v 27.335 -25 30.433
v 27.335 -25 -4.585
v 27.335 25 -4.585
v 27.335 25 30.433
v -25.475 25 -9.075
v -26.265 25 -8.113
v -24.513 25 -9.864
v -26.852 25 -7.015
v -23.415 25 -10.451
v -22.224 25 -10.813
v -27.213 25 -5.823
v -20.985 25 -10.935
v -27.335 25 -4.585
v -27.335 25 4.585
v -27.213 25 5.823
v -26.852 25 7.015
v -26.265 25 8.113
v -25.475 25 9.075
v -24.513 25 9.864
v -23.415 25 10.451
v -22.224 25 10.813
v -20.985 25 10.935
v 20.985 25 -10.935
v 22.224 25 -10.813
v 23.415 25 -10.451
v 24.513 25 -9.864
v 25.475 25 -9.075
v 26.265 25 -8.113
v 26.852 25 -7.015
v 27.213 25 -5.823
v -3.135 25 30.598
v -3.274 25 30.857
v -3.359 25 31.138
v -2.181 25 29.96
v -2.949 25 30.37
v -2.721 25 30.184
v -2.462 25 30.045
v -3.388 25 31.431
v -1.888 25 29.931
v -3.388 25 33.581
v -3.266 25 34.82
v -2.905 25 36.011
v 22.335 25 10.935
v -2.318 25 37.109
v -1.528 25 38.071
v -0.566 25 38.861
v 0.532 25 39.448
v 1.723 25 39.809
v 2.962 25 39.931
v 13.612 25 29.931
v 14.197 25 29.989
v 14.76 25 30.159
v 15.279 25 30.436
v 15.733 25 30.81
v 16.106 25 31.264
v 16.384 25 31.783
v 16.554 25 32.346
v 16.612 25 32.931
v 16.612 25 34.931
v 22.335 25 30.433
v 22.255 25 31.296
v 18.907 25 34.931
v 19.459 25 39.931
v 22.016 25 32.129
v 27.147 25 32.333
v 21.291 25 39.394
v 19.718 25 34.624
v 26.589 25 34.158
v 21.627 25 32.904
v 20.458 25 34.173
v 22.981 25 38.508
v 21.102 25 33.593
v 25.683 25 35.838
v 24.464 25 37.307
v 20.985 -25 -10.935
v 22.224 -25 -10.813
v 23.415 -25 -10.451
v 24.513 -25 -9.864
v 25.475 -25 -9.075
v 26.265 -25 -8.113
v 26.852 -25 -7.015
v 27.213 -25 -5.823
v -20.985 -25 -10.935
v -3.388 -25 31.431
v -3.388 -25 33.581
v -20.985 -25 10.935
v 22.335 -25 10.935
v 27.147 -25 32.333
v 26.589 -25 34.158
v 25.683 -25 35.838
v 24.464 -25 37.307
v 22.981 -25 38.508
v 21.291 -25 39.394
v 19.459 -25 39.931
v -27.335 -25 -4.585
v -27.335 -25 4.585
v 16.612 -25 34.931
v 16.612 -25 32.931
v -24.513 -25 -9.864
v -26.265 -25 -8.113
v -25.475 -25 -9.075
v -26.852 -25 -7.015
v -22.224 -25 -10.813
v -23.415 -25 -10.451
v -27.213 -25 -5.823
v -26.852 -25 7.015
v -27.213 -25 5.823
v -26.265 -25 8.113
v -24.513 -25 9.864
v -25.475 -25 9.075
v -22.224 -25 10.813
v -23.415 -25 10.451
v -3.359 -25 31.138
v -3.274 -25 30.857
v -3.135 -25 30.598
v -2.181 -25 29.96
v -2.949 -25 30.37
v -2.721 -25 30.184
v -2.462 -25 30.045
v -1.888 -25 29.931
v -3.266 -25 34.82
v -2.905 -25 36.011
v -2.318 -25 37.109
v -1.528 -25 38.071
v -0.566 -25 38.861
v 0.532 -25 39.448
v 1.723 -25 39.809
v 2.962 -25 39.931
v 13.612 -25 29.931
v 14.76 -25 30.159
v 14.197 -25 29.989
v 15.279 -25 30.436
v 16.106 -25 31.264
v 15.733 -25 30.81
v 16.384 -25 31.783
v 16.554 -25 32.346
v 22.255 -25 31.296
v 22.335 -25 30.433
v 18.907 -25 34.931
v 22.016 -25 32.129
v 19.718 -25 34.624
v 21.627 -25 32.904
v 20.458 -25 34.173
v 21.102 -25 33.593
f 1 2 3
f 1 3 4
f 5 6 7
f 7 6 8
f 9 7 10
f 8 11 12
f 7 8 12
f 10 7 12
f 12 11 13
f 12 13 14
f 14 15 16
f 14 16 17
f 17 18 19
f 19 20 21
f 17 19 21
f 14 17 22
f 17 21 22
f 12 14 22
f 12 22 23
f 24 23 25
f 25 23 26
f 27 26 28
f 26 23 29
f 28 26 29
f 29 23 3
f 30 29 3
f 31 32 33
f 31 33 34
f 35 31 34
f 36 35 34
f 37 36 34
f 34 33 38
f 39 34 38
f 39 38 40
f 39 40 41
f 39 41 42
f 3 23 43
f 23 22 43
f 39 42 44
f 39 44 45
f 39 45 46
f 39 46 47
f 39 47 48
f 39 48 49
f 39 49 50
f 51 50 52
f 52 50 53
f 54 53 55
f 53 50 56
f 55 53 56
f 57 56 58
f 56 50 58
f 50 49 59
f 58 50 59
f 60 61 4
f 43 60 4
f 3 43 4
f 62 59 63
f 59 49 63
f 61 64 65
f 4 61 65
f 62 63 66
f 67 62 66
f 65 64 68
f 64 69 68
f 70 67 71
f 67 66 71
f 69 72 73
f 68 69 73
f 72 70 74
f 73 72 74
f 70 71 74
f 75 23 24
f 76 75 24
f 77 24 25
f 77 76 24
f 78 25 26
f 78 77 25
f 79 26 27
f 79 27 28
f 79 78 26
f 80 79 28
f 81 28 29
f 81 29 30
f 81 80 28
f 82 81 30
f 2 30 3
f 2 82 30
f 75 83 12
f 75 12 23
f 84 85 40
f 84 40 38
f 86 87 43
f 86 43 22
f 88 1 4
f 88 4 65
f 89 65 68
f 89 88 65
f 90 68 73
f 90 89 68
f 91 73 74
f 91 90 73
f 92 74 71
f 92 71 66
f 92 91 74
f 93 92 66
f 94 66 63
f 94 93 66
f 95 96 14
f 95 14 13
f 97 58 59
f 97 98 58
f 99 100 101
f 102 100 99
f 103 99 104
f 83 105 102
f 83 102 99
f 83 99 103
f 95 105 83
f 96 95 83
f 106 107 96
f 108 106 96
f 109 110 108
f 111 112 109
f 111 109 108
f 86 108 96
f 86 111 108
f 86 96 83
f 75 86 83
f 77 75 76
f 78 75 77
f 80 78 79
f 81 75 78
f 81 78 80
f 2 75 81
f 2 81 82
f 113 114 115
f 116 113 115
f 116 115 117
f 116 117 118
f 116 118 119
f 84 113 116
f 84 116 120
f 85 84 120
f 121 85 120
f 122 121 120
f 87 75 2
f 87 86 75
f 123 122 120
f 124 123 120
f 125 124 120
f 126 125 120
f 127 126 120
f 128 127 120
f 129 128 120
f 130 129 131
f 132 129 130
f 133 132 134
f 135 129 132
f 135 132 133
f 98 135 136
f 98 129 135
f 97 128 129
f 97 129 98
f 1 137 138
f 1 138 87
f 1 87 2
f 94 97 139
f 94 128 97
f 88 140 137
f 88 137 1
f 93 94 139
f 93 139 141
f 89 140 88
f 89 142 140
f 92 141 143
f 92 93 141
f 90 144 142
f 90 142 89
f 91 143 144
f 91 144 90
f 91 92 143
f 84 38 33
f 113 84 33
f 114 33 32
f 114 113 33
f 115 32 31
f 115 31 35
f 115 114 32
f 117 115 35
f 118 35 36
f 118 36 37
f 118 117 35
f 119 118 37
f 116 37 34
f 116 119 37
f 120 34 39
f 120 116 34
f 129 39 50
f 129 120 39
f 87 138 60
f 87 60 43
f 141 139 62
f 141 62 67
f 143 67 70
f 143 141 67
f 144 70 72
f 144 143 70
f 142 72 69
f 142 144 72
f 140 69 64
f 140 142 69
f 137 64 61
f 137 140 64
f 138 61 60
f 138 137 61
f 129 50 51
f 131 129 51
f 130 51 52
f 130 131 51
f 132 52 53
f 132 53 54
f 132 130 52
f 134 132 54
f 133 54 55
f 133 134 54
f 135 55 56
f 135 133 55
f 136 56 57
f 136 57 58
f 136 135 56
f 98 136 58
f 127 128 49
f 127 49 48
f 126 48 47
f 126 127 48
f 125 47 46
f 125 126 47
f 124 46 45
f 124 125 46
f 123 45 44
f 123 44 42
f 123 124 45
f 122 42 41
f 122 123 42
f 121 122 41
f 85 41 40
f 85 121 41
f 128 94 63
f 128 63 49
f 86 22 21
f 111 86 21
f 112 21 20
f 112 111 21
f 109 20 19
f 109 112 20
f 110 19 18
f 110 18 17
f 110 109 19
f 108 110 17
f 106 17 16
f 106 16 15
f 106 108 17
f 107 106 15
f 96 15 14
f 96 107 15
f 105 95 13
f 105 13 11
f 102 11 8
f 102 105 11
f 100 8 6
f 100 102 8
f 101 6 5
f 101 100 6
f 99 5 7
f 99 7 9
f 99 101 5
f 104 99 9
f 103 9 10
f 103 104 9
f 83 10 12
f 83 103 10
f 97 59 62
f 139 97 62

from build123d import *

# Parameters (mm, degrees)
F1_DEPTH = 25


with BuildPart() as f1:
    # F0 (on Front) → F1 (new body, symmetric)
    with BuildSketch(Plane.XZ):
        with BuildLine():
            Line((16.612064, 32.930892), (16.612064, 34.930892))
            Line((16.612064, 34.930892), (16.612064, 39.930892))
            Line((16.612064, 39.930892), (2.962064, 39.930892))
            ThreePointArc((2.962064, 39.930892), (-1.528064, 38.07102), (-3.387936, 33.580892))
            Line((-3.387936, 33.580892), (-3.387936, 31.430892))
            ThreePointArc((-3.387936, 31.430892), (-2.948596, 30.370232), (-1.887936, 29.930892))
            Line((-1.887936, 29.930892), (13.612064, 29.930892))
            ThreePointArc((13.612064, 29.930892), (15.733384, 30.809572), (16.612064, 32.930892))
        make_face()
        with BuildLine():
            Line((22.335033, 10.934645), (-20.985033, 10.934645))
            ThreePointArc((-20.985033, 10.934645), (-25.475161, 9.074773), (-27.335033, 4.584645))
            Line((-27.335033, 4.584645), (-27.335033, -4.584645))
            ThreePointArc((-27.335033, -4.584645), (-25.475161, -9.074773), (-20.985033, -10.934645))
            Line((-20.985033, -10.934645), (20.985033, -10.934645))
            ThreePointArc((20.985033, -10.934645), (25.475161, -9.074773), (27.335033, -4.584645))
            Line((27.335033, -4.584645), (27.335033, 10.934645))
            Line((27.335033, 10.934645), (22.335033, 10.934645))
        make_face()
        with BuildLine():
            Line((22.335033, 30.433444), (22.335033, 10.934645))
            Line((22.335033, 10.934645), (27.335033, 10.934645))
            Line((27.335033, 10.934645), (27.335033, 30.433444))
            ThreePointArc((27.335033, 30.433444), (25.109878, 36.602568), (19.459069, 39.930892))
            Line((19.459069, 39.930892), (16.612064, 39.930892))
            Line((16.612064, 39.930892), (16.612064, 34.930892))
            Line((16.612064, 34.930892), (18.907292, 34.930892))
            ThreePointArc((18.907292, 34.930892), (21.380409, 33.26083), (22.335033, 30.433444))
        make_face()
    extrude(amount=F1_DEPTH, both=True)


solid = f1.part
